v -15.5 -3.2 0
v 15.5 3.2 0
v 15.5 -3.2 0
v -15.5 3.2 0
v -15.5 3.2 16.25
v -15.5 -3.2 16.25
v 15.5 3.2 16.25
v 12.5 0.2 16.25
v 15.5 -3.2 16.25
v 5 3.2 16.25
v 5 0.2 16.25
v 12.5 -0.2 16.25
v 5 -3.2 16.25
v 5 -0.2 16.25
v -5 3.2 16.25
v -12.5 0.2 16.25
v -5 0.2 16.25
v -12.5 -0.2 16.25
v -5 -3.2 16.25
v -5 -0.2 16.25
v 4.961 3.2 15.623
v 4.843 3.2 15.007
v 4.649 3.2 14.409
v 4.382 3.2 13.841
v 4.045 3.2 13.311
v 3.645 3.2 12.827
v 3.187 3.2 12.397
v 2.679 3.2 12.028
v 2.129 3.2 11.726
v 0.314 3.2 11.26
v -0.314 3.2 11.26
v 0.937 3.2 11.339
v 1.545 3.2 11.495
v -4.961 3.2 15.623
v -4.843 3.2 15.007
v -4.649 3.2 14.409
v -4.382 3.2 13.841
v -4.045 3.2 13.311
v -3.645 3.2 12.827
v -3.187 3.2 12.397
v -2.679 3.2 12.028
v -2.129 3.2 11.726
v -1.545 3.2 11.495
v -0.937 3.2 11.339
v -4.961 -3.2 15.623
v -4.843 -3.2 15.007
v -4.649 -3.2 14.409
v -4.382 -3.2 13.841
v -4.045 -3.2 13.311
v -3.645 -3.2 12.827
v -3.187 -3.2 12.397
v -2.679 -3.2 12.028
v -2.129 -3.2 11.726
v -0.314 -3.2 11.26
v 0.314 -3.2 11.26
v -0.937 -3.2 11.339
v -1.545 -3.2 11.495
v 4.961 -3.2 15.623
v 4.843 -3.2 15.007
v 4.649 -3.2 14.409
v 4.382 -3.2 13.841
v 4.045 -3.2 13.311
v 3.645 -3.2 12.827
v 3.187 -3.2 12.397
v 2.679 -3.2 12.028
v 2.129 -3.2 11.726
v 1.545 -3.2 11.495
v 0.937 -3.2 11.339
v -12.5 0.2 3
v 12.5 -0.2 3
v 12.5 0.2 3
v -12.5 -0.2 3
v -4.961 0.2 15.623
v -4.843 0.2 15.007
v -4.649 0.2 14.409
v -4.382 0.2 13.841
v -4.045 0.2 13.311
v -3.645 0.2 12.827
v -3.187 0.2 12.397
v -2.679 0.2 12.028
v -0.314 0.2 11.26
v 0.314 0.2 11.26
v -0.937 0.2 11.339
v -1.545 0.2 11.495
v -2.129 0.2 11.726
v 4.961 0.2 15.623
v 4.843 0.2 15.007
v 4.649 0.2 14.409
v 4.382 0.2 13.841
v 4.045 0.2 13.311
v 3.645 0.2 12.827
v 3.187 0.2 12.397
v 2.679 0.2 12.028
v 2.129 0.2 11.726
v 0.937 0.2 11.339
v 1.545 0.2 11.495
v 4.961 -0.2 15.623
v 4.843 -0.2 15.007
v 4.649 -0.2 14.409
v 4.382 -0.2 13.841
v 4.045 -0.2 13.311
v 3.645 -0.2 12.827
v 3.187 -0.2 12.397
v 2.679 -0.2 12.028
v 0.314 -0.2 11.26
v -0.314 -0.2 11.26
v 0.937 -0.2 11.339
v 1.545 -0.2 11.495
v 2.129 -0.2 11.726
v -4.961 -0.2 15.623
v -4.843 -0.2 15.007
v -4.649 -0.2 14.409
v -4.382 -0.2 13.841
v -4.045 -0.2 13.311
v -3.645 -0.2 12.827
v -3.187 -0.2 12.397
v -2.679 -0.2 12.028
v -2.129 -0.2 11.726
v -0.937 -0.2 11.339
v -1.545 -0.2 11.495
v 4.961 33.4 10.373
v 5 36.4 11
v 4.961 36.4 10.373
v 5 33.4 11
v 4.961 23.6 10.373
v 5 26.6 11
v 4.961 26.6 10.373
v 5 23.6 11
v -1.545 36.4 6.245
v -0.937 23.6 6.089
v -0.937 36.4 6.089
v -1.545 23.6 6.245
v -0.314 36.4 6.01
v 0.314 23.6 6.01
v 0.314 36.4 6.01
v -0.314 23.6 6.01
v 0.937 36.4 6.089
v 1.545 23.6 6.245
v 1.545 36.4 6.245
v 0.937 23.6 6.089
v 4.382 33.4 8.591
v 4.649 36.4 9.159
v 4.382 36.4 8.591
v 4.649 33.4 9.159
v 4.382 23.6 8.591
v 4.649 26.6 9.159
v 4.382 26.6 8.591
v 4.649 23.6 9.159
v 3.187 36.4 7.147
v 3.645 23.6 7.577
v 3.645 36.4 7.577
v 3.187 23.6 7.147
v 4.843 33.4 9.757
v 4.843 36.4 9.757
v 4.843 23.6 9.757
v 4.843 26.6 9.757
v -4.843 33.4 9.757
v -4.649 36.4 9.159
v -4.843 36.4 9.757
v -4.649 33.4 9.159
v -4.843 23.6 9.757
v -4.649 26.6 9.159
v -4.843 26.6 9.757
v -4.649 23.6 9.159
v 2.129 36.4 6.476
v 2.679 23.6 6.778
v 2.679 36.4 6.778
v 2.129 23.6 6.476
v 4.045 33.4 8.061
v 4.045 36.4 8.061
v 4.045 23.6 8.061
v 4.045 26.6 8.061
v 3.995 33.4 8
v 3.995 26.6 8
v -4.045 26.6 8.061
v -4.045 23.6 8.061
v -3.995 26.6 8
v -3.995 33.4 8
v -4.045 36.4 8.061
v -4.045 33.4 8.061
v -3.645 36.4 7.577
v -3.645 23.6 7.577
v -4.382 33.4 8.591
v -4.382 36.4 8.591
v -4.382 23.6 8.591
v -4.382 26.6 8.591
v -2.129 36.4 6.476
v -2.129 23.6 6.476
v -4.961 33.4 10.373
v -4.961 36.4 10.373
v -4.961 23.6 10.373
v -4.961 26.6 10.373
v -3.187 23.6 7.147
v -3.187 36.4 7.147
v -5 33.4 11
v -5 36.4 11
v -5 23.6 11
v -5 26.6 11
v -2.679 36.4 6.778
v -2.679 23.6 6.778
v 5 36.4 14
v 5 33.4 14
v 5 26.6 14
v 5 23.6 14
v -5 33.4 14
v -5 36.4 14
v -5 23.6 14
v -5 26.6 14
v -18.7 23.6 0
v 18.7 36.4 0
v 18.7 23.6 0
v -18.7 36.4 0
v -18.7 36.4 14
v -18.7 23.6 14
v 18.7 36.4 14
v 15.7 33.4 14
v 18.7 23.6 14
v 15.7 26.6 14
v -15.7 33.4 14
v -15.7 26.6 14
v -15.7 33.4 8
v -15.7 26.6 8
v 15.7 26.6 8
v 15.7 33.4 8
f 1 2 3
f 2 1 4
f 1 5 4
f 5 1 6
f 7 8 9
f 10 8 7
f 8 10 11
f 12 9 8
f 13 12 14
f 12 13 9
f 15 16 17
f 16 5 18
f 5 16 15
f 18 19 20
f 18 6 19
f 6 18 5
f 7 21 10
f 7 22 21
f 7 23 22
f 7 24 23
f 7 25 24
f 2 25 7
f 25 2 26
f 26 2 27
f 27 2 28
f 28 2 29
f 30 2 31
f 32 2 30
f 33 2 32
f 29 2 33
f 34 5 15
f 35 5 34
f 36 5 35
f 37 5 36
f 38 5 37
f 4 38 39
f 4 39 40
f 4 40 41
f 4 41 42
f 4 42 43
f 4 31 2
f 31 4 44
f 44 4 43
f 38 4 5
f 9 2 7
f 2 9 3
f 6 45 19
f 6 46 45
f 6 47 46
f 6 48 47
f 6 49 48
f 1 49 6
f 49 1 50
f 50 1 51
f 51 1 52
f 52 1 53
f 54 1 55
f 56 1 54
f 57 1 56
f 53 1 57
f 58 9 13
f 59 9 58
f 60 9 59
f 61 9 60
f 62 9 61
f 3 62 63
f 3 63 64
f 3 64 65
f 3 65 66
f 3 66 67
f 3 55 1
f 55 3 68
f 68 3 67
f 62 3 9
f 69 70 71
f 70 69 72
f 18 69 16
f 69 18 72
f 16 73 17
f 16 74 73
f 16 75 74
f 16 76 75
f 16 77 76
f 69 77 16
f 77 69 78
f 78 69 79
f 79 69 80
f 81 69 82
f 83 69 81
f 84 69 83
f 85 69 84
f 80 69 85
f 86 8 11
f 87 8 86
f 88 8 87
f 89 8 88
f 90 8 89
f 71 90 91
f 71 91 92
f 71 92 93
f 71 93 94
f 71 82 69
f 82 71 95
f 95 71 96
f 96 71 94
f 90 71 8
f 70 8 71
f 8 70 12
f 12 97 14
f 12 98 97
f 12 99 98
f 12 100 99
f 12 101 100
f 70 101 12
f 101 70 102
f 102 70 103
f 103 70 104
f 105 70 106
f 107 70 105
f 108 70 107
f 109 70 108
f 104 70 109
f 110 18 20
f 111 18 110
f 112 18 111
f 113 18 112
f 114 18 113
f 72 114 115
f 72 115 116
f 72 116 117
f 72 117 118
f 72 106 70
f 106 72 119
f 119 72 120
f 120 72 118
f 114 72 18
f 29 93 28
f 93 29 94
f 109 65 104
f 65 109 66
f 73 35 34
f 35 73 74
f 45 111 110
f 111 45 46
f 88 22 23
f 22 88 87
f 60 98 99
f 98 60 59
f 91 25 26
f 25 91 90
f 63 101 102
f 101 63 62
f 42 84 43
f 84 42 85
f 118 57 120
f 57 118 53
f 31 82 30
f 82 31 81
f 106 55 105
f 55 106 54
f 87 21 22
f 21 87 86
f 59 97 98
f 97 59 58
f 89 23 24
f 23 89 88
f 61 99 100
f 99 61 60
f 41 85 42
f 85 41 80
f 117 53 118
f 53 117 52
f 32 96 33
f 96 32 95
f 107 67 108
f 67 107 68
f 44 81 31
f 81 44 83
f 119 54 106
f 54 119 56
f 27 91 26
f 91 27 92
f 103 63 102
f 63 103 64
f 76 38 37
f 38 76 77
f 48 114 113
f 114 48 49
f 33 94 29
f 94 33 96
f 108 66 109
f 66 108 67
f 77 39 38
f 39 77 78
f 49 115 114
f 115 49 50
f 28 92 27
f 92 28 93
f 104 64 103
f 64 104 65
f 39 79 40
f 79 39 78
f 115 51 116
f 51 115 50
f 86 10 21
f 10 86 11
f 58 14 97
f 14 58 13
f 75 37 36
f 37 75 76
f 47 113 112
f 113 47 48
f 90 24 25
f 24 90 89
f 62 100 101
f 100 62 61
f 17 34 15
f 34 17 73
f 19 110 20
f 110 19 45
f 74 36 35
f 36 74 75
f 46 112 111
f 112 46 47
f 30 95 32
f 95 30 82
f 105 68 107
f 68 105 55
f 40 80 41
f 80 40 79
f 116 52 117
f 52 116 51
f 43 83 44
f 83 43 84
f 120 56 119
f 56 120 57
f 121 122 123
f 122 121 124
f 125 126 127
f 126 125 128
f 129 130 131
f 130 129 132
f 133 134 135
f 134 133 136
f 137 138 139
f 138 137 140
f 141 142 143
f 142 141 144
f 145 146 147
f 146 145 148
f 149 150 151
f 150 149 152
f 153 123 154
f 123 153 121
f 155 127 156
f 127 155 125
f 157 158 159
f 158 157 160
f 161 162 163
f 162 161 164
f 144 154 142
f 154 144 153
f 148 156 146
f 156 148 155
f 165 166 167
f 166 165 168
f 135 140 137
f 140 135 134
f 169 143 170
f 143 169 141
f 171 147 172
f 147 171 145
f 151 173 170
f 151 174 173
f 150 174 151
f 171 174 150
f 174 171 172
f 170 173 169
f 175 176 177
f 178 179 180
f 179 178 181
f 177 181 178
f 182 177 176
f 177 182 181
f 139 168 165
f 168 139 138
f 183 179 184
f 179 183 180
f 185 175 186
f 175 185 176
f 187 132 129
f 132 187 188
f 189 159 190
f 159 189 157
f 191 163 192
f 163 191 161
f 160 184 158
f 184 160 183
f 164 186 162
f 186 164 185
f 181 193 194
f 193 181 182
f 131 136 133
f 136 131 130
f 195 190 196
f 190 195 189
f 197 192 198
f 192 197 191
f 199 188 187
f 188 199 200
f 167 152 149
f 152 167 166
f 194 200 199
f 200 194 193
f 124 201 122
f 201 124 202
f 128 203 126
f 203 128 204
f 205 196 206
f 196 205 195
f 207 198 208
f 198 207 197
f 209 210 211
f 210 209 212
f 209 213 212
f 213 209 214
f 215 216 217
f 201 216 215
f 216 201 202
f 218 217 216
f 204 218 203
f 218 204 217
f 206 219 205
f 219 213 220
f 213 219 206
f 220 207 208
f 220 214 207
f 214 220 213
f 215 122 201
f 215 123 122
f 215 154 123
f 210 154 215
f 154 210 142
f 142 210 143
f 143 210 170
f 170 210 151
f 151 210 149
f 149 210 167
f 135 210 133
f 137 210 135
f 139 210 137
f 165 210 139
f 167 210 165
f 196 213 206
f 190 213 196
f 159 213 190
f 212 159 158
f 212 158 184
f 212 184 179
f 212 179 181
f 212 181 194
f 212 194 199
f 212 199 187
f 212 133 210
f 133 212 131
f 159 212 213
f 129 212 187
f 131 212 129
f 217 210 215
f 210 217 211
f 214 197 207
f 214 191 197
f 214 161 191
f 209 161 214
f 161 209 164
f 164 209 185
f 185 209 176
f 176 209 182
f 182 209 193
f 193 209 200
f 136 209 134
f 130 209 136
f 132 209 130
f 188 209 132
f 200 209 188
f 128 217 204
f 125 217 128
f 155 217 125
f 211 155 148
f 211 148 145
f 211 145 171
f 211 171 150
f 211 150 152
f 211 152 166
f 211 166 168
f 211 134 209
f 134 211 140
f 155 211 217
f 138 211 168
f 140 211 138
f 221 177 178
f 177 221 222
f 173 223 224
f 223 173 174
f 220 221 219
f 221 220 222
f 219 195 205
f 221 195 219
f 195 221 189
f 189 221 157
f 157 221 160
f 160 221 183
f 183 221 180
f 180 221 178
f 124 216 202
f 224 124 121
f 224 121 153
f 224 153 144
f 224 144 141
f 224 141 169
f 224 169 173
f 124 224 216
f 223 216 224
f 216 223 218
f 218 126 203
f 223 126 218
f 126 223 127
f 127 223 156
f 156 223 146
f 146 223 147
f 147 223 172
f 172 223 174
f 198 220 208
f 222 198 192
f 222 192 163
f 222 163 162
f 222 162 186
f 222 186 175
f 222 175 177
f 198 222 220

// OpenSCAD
$fn = 50;

bladeThickness = 0.4;
bladeWidth = 9;

cutterWidth = 30;
wallThickness = 3;

bladeLength = 25;
cableRadius = 5;
cutDepth = 0.75;

cutterTopDepth = 3;

clearance = 0.2;

cutter();

module cutter()
{
    cutterBottom();
    translate([0, 30, 0])
    {
        cutterTop();
    }
}

module cutterBottom()
{
    difference()
    {
        linear_extrude(height = wallThickness + cableRadius + bladeWidth - cutDepth)
        {
            square([bladeLength + 2 * wallThickness, bladeThickness + 2 * wallThickness], center = true);
        }
        blade(bladeWidth + cableRadius - cutDepth + 0.1);
        translate([0, 0, wallThickness + bladeWidth - cutDepth + cableRadius])
        {
            rotate([90, 0, 0])
            {
                cylinder(r = cableRadius, h = 2 * wallThickness + bladeThickness + 0.2, center = true);
            }
        }
    }
//    color([1, 0, 0])
//    {
//        blade(bladeWidth);
//    }
}

module blade(width)
{
    translate([0, 0, wallThickness])
    {
        linear_extrude(height = width)
        {
            square([bladeLength, bladeThickness], center = true);
        }
    }
}

module cutterTop()
{
    difference()
    {
        linear_extrude(height = 2 * wallThickness + cableRadius + cutterTopDepth)
        {
            square([bladeLength + 4 * wallThickness + 2 * clearance, 4 * wallThickness + bladeThickness + 2 * clearance], center = true);
        }
        translate([0, 0, wallThickness + cableRadius])
        {
            linear_extrude(height = 2 * wallThickness + cableRadius)
            {
                square([bladeLength + 2 * wallThickness + 2 * clearance, 2 * wallThickness + bladeThickness + 2 * clearance], center = true);
            }
        }
        translate([0, 0, 2 * wallThickness + cableRadius])
        {
            rotate([90, 0, 0])
            {
                cylinder(r = cableRadius, h = 4 * wallThickness + 2 * clearance + bladeThickness + 0.2, center = true);
                translate([-cableRadius, 0, -bladeThickness / 2 - 2 * wallThickness - clearance - 0.1])
                {
                    cube([2 * cableRadius, cutterTopDepth + 0.1, bladeThickness + 4 * wallThickness + 2 * clearance + 0.2]);
                }
            }
        }
    }
}
